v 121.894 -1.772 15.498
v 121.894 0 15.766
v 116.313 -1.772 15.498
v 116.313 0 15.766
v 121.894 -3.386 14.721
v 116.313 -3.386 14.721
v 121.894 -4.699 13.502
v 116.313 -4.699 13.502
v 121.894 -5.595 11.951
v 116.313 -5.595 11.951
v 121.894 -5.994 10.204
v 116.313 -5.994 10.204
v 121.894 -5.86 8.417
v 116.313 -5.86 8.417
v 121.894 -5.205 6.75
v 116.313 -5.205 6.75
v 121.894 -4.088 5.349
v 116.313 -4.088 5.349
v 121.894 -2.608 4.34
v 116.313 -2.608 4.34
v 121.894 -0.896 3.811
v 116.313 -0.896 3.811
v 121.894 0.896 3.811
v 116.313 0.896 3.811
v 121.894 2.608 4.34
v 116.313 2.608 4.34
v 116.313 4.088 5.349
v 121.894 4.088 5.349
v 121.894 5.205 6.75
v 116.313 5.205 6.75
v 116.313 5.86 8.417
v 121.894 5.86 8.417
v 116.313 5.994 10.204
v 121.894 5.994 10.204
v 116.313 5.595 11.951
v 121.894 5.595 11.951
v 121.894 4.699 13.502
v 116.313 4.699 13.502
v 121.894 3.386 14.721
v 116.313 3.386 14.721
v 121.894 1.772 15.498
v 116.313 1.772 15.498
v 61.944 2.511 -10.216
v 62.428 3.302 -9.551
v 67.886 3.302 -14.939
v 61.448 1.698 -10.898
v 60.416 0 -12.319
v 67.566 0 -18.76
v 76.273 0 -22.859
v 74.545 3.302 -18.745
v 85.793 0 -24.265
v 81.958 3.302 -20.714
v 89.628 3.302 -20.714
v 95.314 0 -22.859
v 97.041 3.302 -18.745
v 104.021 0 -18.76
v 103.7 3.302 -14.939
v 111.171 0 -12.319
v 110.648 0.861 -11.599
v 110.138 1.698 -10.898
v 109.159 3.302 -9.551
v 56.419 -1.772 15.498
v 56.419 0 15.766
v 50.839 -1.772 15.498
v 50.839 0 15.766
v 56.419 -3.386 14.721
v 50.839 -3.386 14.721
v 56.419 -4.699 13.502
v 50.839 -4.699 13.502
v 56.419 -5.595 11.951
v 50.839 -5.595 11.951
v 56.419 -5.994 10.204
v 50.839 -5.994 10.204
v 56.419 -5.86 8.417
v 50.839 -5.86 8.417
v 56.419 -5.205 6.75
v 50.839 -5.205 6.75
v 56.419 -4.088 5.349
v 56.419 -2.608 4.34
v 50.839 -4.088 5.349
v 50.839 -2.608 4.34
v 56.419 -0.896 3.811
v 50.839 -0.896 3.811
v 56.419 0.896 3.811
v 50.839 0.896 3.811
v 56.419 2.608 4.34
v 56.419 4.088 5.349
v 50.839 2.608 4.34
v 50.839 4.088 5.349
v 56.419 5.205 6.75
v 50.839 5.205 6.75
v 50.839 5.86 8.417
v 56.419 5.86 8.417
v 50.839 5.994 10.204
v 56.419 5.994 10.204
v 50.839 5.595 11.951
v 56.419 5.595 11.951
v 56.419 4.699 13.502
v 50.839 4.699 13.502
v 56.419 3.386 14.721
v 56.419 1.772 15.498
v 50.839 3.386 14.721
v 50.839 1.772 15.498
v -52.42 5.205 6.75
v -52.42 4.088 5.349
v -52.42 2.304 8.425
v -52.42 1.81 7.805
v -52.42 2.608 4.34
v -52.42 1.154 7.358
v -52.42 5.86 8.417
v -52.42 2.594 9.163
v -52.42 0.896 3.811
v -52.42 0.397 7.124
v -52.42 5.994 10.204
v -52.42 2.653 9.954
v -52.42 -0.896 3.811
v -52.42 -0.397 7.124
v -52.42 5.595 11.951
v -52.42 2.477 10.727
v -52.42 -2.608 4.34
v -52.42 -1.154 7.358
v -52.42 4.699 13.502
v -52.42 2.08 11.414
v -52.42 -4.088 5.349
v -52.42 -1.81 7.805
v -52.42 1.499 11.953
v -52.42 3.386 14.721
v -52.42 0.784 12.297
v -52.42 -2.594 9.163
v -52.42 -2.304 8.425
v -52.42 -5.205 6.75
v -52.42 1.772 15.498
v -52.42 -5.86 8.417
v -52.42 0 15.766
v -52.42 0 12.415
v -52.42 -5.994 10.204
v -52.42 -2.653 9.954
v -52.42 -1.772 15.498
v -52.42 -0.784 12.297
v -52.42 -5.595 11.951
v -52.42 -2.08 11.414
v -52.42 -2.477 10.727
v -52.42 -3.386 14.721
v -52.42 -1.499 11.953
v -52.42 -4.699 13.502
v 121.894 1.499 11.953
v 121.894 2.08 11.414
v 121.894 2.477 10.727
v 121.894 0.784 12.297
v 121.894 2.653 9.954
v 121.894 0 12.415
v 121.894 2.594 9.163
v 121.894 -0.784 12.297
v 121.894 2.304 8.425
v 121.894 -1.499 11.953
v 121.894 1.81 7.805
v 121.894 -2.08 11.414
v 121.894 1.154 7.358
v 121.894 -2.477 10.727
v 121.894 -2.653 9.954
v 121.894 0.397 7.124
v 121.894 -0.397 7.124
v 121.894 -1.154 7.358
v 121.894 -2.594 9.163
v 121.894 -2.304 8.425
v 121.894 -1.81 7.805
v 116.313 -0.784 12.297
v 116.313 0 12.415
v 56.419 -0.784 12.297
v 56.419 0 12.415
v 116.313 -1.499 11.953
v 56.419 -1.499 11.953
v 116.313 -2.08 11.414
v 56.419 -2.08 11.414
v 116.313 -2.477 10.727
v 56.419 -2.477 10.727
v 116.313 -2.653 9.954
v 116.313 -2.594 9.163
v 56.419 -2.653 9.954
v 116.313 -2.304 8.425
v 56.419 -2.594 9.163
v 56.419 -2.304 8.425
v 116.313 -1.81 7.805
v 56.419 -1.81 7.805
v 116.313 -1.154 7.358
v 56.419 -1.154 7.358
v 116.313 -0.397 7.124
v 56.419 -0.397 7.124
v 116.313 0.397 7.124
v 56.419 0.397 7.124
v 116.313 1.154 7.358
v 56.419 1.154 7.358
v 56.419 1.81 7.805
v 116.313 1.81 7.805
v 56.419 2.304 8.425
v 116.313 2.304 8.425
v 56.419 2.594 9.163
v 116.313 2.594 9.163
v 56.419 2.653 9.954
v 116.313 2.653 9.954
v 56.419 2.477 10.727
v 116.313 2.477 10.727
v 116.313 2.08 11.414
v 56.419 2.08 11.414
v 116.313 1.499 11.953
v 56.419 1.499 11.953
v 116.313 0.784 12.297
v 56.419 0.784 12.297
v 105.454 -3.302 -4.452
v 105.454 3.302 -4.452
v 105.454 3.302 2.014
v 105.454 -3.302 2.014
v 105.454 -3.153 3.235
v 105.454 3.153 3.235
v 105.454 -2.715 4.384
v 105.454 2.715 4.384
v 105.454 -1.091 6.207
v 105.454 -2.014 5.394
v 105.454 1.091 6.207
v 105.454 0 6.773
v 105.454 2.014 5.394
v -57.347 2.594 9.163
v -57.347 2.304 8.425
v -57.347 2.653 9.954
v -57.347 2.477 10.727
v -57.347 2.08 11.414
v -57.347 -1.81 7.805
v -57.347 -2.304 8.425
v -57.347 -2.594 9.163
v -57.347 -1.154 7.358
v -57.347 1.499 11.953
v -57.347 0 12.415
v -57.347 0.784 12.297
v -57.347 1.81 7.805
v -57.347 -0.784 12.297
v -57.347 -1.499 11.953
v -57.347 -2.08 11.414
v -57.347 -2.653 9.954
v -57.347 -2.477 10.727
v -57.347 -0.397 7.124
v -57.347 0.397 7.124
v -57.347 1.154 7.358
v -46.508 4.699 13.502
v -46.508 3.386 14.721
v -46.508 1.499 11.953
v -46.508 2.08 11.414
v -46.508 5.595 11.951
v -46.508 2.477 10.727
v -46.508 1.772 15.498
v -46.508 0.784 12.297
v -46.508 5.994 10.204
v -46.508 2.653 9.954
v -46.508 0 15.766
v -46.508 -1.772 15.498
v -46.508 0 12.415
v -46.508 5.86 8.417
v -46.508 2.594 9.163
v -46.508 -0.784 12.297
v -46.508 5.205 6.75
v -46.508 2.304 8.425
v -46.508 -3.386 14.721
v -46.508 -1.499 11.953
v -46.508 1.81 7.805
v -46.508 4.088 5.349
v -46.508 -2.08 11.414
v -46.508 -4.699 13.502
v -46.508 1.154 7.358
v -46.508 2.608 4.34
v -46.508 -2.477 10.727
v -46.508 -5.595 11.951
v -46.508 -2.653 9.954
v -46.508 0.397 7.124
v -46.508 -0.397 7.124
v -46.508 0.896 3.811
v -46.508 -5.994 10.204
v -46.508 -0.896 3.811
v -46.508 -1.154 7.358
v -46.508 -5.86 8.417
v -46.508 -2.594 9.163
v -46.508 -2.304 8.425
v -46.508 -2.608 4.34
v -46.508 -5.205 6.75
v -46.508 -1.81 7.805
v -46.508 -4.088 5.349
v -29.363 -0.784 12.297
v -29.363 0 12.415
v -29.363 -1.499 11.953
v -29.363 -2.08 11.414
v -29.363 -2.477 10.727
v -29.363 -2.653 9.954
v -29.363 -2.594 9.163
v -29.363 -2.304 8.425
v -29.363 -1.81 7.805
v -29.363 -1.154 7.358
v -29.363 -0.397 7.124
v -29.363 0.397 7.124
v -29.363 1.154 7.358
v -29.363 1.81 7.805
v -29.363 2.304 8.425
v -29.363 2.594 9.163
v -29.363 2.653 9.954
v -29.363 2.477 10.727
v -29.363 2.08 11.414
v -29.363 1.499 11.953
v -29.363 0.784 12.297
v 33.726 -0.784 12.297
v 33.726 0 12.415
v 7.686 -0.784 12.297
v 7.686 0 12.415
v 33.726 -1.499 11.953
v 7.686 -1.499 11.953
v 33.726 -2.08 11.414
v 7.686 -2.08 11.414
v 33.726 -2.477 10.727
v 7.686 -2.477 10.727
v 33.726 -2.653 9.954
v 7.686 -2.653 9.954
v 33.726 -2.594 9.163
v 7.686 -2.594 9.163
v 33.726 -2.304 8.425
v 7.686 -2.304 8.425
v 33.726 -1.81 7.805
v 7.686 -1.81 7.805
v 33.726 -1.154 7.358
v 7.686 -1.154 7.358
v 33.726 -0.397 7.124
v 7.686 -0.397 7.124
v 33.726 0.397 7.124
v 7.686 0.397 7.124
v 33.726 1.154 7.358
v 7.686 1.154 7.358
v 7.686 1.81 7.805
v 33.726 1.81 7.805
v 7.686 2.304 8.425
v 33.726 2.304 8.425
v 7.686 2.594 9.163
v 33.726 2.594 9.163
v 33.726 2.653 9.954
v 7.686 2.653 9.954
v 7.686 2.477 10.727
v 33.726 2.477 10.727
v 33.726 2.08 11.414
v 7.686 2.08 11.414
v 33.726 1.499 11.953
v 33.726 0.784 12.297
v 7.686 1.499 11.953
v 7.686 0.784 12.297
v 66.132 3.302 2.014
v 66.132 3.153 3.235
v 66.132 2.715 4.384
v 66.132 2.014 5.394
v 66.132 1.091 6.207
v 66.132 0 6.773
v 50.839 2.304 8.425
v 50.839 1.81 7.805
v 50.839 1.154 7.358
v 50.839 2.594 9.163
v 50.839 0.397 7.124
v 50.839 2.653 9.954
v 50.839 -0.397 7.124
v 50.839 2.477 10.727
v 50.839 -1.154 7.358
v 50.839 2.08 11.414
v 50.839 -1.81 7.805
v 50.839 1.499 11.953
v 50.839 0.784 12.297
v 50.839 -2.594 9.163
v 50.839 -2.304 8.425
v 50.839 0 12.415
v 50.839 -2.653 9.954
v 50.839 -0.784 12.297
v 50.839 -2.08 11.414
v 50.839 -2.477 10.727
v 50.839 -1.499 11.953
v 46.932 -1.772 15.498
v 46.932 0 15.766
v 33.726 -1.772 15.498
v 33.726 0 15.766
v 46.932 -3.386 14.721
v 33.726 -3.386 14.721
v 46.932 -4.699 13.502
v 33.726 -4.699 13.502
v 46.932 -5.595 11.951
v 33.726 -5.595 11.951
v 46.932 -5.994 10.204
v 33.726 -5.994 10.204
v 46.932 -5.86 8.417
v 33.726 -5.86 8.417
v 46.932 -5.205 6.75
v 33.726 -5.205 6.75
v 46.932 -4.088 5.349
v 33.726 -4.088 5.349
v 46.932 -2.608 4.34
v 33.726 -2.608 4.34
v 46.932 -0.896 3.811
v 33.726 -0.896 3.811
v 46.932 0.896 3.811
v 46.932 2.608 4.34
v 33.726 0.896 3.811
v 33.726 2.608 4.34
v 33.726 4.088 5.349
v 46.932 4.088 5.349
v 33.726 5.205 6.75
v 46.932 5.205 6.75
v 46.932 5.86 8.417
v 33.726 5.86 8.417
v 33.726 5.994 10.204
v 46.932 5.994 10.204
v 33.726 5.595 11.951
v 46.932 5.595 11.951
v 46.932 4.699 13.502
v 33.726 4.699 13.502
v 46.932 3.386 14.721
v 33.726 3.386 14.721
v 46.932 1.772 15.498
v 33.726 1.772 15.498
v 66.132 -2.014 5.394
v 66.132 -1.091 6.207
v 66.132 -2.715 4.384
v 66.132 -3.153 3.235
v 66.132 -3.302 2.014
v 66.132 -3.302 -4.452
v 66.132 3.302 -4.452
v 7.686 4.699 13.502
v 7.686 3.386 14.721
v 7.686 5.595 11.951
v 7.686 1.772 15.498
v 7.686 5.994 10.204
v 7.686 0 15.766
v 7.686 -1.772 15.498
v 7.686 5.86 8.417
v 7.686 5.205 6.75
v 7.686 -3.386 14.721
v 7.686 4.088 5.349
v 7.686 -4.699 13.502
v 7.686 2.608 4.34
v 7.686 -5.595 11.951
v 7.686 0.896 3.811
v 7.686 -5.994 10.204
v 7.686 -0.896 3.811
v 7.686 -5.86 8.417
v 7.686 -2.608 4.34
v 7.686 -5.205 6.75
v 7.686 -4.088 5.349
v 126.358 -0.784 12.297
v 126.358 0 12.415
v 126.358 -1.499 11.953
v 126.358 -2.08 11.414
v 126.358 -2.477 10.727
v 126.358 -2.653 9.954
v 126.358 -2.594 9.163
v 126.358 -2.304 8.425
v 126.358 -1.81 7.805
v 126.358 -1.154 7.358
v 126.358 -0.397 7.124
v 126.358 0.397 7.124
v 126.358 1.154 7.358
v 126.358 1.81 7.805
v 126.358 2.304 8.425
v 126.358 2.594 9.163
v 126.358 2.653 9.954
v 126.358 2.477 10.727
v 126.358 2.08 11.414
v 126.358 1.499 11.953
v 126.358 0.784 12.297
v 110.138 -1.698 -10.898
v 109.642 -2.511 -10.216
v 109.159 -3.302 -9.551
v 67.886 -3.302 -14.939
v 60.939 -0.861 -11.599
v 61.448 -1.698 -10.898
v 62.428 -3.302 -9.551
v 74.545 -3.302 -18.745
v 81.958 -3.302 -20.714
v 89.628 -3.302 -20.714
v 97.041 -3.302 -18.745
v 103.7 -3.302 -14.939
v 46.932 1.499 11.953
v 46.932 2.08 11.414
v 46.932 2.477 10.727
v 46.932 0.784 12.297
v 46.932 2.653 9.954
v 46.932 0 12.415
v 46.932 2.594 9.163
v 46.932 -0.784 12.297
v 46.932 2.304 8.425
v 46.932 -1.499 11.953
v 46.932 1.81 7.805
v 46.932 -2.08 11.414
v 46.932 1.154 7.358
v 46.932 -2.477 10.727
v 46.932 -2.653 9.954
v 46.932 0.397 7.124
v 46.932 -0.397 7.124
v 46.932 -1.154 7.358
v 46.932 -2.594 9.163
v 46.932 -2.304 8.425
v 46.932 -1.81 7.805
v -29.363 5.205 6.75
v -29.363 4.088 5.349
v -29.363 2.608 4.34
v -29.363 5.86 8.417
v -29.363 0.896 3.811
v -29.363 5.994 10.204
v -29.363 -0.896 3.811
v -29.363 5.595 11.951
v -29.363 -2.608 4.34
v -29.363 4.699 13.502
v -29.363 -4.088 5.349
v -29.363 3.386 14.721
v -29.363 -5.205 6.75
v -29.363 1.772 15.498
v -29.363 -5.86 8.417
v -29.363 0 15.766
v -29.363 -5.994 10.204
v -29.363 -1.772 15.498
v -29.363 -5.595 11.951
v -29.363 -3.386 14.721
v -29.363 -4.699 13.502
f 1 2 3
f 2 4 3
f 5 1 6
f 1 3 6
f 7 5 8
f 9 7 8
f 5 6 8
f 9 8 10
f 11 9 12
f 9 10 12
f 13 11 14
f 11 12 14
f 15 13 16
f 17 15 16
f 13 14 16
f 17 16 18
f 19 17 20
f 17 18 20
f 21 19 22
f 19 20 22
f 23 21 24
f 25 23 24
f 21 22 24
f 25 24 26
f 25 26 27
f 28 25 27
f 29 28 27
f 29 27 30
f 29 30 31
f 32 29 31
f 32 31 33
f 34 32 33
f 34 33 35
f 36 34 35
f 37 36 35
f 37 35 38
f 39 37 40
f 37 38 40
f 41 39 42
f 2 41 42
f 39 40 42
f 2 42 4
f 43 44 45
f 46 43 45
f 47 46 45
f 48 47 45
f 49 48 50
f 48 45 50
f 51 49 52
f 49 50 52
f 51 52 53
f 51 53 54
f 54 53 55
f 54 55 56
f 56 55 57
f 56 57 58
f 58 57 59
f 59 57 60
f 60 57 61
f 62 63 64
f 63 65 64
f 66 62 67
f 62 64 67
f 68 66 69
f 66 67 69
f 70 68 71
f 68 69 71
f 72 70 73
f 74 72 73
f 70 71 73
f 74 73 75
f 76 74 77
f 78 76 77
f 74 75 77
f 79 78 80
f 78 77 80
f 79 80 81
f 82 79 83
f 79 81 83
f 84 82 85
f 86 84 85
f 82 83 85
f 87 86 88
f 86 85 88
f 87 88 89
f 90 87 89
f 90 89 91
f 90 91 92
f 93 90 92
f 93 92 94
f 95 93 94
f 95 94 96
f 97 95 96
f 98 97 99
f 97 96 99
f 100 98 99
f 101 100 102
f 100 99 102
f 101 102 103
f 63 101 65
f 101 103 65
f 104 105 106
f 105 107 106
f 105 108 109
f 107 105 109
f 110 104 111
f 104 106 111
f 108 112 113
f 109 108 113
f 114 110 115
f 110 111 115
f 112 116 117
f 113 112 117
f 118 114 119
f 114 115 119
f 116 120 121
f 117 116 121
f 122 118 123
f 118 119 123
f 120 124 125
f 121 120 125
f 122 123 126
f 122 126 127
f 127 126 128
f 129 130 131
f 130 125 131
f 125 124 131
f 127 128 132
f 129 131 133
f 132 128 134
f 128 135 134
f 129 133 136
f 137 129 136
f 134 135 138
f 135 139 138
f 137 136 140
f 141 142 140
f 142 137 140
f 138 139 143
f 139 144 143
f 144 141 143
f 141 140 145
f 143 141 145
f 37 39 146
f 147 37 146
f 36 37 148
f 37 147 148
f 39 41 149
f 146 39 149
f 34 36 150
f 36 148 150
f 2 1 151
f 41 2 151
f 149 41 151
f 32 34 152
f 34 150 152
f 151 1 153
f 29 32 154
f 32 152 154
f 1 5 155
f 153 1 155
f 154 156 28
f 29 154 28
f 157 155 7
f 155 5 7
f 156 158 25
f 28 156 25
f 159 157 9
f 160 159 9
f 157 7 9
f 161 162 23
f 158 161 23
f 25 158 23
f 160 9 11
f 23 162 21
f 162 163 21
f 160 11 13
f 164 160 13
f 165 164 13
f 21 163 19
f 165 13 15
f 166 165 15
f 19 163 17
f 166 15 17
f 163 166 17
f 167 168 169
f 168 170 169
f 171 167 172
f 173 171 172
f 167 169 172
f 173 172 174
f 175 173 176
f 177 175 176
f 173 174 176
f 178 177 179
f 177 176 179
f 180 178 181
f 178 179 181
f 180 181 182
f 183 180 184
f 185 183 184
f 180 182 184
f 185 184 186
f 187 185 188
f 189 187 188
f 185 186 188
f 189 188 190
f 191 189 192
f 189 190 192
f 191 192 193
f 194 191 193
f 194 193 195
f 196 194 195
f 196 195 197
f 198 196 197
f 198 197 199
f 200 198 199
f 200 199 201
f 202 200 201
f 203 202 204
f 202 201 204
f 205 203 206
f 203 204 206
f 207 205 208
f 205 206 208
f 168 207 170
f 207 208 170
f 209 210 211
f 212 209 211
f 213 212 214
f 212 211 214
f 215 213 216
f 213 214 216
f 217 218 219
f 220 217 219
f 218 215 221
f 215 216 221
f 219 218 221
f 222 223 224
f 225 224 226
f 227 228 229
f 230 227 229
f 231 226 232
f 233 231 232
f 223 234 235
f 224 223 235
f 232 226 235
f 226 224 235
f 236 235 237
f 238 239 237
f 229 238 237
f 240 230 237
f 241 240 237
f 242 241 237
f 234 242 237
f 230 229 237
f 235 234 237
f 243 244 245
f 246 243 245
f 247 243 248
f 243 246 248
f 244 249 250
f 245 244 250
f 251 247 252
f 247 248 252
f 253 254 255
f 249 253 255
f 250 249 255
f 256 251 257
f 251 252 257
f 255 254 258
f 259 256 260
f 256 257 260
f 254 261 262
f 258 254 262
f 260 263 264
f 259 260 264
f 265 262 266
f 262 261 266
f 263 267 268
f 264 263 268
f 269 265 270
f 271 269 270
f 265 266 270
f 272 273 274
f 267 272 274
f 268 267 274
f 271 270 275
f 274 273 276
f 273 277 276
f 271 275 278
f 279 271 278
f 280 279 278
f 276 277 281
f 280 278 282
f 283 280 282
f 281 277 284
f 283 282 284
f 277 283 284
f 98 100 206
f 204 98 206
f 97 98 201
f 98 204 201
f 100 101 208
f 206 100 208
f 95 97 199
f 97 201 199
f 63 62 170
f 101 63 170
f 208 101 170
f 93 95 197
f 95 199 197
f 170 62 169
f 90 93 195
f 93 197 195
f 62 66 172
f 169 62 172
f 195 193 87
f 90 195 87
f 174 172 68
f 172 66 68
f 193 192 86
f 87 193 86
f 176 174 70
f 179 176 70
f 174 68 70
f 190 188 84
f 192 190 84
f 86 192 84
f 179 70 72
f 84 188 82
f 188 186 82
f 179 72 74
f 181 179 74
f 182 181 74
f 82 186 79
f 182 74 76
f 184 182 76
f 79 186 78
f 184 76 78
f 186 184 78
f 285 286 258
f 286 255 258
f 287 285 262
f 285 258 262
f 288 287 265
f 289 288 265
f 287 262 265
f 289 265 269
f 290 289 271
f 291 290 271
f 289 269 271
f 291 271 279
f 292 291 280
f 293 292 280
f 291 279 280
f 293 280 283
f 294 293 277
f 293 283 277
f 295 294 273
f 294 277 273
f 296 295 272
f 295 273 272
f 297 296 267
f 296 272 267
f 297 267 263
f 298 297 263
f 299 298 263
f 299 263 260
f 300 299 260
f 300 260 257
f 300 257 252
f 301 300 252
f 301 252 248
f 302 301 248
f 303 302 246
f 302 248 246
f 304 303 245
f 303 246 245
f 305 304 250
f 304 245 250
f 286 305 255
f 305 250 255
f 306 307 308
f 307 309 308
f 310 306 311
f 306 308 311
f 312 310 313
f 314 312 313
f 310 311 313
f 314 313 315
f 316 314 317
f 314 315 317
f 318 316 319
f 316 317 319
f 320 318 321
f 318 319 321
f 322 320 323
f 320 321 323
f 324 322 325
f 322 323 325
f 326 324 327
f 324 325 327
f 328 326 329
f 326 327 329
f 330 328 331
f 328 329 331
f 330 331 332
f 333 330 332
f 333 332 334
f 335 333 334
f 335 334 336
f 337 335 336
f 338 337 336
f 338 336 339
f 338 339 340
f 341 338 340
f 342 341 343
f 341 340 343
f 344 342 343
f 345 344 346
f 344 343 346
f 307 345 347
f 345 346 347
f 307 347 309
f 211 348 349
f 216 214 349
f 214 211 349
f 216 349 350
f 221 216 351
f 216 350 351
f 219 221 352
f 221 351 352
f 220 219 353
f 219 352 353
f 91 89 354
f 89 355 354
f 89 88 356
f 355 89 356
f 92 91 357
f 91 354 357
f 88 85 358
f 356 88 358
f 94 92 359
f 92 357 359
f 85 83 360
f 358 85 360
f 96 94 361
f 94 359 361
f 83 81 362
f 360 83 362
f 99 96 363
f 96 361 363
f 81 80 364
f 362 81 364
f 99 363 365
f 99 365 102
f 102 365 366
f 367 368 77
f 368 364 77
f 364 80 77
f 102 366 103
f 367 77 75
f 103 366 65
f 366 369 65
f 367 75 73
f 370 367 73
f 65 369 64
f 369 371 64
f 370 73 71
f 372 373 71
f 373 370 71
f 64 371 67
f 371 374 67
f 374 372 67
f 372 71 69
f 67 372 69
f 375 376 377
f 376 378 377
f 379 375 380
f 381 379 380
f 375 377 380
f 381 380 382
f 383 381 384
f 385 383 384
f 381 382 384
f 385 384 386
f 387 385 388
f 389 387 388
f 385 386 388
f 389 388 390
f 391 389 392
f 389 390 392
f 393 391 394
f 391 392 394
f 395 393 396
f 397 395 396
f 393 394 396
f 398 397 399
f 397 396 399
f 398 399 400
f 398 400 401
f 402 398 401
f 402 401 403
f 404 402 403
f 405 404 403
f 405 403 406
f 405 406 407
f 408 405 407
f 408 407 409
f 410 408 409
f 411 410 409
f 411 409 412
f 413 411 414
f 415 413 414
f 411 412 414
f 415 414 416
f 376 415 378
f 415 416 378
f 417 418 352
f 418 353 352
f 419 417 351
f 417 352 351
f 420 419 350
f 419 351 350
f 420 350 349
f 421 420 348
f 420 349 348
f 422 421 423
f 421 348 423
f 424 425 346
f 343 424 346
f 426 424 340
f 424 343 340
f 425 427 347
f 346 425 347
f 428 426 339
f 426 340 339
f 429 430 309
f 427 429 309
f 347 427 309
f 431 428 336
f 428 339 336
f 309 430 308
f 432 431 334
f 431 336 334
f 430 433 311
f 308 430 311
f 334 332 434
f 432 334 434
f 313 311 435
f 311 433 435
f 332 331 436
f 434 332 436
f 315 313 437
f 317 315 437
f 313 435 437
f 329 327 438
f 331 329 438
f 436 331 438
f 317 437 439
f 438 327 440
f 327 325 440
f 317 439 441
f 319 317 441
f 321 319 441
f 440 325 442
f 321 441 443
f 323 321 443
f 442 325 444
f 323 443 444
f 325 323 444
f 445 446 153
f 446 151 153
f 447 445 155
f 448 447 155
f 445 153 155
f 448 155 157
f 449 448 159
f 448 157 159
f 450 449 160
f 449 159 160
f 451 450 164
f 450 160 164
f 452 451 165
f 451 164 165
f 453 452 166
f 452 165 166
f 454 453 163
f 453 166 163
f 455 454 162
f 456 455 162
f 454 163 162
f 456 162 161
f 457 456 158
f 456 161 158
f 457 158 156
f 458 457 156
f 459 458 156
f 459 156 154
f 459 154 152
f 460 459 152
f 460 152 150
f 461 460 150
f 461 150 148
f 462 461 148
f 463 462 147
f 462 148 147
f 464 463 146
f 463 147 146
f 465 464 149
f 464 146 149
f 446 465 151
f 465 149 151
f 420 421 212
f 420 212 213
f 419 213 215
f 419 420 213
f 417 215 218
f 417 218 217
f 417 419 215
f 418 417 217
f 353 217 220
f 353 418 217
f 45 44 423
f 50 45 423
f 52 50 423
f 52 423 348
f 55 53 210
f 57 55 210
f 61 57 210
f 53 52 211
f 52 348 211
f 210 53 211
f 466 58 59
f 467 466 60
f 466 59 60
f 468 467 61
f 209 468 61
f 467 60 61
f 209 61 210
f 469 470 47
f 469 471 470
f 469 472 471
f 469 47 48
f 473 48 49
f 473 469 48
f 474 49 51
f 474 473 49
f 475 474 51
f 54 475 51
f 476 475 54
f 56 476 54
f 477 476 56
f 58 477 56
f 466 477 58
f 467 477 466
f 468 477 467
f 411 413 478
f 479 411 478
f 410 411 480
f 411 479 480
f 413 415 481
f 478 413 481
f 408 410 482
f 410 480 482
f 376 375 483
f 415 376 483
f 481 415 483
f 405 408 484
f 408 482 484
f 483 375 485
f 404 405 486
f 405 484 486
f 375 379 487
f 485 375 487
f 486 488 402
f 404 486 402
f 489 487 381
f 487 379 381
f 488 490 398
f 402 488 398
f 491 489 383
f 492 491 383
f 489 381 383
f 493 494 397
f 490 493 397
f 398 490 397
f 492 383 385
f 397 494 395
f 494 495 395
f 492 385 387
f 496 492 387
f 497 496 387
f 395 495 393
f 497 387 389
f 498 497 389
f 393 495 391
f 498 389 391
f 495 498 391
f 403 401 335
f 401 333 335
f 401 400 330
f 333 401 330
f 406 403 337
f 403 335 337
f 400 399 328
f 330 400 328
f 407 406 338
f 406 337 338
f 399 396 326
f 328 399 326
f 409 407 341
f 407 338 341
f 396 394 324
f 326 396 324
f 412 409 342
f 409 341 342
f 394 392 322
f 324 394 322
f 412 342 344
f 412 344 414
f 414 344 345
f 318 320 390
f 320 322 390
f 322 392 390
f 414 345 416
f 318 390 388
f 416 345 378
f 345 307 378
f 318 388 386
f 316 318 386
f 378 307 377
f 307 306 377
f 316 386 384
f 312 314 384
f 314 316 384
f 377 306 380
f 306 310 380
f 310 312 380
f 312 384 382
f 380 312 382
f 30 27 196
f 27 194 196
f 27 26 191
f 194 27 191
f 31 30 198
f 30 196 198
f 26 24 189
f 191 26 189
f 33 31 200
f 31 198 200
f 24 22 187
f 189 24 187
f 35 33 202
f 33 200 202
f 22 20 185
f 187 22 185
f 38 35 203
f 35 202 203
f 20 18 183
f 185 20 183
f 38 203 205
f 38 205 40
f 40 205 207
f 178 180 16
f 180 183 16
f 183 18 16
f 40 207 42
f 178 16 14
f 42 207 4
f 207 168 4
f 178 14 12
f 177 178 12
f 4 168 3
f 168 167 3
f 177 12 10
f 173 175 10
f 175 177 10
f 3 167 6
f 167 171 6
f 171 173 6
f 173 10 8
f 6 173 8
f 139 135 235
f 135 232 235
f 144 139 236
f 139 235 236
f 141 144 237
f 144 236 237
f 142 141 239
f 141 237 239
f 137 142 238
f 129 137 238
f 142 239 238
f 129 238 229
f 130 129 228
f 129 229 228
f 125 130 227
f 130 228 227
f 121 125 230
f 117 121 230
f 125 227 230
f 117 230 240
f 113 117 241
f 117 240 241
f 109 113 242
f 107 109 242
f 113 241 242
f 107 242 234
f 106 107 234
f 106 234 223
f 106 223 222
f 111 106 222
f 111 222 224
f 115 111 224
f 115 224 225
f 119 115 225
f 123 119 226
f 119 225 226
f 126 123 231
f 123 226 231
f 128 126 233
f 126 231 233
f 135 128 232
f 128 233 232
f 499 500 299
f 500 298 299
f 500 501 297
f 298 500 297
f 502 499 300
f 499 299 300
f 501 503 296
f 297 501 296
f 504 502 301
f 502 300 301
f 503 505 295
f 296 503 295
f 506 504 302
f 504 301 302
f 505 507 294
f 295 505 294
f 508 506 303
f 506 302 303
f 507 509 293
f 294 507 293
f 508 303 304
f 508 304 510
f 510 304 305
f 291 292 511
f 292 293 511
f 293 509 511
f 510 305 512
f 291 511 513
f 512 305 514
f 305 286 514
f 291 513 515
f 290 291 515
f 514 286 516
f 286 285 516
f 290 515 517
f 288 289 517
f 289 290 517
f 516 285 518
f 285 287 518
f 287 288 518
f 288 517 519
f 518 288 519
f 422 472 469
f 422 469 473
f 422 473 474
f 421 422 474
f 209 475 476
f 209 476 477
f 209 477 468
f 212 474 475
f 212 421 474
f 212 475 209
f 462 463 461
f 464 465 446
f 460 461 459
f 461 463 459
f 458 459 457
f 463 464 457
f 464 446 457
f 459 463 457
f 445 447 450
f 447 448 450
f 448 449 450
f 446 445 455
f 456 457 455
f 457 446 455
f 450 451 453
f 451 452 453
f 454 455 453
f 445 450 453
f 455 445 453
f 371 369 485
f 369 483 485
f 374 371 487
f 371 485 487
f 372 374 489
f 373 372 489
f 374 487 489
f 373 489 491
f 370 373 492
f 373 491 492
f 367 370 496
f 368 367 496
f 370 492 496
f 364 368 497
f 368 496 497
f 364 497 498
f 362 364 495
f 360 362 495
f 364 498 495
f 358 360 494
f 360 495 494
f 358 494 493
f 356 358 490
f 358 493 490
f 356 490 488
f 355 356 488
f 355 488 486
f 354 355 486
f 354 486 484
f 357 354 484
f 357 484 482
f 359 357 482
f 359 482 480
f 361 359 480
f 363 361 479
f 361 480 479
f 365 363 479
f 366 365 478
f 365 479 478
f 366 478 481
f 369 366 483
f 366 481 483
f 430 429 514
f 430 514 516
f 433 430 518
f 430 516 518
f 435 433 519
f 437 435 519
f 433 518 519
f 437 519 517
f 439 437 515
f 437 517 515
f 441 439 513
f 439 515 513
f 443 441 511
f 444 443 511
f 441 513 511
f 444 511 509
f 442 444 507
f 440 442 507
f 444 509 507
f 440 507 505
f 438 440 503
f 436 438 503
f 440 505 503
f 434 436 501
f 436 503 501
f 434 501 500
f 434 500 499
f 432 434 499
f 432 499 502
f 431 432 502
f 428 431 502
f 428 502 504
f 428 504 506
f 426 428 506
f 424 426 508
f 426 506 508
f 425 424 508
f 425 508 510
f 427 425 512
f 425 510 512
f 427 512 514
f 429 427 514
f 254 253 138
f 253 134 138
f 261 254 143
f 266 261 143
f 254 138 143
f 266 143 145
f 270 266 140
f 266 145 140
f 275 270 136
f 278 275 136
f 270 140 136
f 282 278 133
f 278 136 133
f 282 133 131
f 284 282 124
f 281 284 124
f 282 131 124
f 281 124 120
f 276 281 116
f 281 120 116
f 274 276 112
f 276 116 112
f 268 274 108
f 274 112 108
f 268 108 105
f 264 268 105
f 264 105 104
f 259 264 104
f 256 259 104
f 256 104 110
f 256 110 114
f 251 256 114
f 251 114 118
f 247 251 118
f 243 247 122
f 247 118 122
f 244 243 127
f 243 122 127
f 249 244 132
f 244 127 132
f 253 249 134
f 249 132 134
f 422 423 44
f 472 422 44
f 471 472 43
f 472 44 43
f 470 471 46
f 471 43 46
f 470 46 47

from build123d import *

# Parameters (mm, degrees)
F2_DEPTH    = 3.302
F3_DEPTH    = 3.302
F4_T2_ANGLE = 142.4839860816
F4_T4_ANGLE = 142.4839860816
F5_T1_DEPTH = 64.7221527338


# Not quite as in the source:
# - a fillet or chamfer that OpenCascade refuses, or shapes differently, is made with other operations: its cross-section is extruded or revolved along the edge and cut away or added


with BuildPart() as f1:
    # F0 (on Front) → F1 (revolve)
    with BuildSketch(Plane.XZ):
        Polygon((-57.3470704257, 12.4153448269), (-57.3470704257, 9.7549136262), (126.3579279184, 9.7549136262), (126.3579279184, 12.4153448269), (121.8937337399, 12.4153448269), (121.8937337399, 15.7655160874), (116.3134798408, 15.7655160874), (116.3134798408, 12.4153448269), (56.4188025892, 12.4153448269), (56.4188025892, 15.7655160874), (50.8385524154, 15.7655160874), (50.8385524154, 12.4153448269), (46.9323731959, 12.4153448269), (46.9323731959, 15.7655160874), (33.7257832289, 15.7655160874), (33.7257832289, 12.4153448269), (7.6856887899, 12.4153448269), (7.6856887899, 15.7655160874), (-29.3632764369, 15.7655160874), (-29.3632764369, 12.4153448269), (-46.5082786977, 12.4153448269), (-46.5082786977, 15.7655160874), (-52.420347929, 15.7655160874), (-52.420347929, 12.4153448269), align=None)
    revolve(axis=Axis((34.5054287463, 0, 9.7549136262), (1, 0, 0)))


with BuildPart() as f2:
    # F0 (on Front) → F2 (new body)
    with BuildSketch(Plane.XZ):
        with BuildLine():
            Line((105.4544225335, -4.4515635818), (105.4544225335, 7.0944824256))
            Line((105.4544225335, 7.0944824256), (66.1322697997, 7.0944824256))
            Line((66.1322697997, 7.0944824256), (66.1322697997, -4.4515635818))
            Line((66.1322697997, -4.4515635818), (59.3388823657, -13.8018592247))
            ThreePointArc((59.3388823657, -13.8018592247), (85.7933461666, -26.0433622806), (112.2478099675, -13.8018592247))
            Line((112.2478099675, -13.8018592247), (105.4544225335, -4.4515635818))
        make_face()
    extrude(amount=-F2_DEPTH)

    # F3 (add): a face of the model
    f3_faces = [f2.faces().sort_by_distance(p)[0] for p in [
        (85.7933461666, 0, -8.9000253062),
    ]]
    extrude(f3_faces, amount=F3_DEPTH)

    # F4: chamfer of 5.08 on 2 edges, made by hand

    # F4_s1 → F4_t2 (revolve, cut)
    with BuildSketch(Plane(origin=(6.2342301427, 0, -18.3570212695), x_dir=(0, 1, 0), z_dir=(-0.3215717936, 0, 0.9468851998))):
        Polygon((1.778, -49.3165019961), (-3.302, -54.3965019961), (-3.302, -49.3165019961), align=None)
    revolve(axis=Axis((85.7933461666, -3.302, 8.6620594386), (0, -1, 0)), revolution_arc=F4_T2_ANGLE, mode=Mode.SUBTRACT)

    # F4_s3 → F4_t4 (revolve, cut)
    with BuildSketch(Plane(origin=(6.2342301427, 0, -18.3570212695), x_dir=(0, 1, 0), z_dir=(-0.3215717936, 0, 0.9468851998))):
        Polygon((-1.778, -49.3165019961), (3.302, -54.3965019961), (3.302, -49.3165019961), align=None)
    revolve(axis=Axis((85.7933461666, 3.302, 8.6620594386), (0, -1, 0)), revolution_arc=F4_T4_ANGLE, mode=Mode.SUBTRACT)

    # F5: fillet of radius 5.08 on 2 edges, made by hand

    # F5_s2 → F5_t1 (cut)
    with BuildSketch(Plane.YZ.offset(53.4322697997)):
        with BuildLine():
            ThreePointArc((-3.302, 2.0144824256), (-1.8141024484, 5.606584874), (1.778, 7.0944824256))
            Line((1.778, 7.0944824256), (-3.302, 7.0944824256))
            Line((-3.302, 7.0944824256), (-3.302, 2.0144824256))
        make_face()
        with BuildLine():
            ThreePointArc((3.302, 2.0144824256), (1.8141024484, 5.606584874), (-1.778, 7.0944824256))
            Line((-1.778, 7.0944824256), (3.302, 7.0944824256))
            Line((3.302, 7.0944824256), (3.302, 2.0144824256))
        make_face()
    extrude(amount=F5_T1_DEPTH, mode=Mode.SUBTRACT)


solid = Compound([f1.part, f2.part])
